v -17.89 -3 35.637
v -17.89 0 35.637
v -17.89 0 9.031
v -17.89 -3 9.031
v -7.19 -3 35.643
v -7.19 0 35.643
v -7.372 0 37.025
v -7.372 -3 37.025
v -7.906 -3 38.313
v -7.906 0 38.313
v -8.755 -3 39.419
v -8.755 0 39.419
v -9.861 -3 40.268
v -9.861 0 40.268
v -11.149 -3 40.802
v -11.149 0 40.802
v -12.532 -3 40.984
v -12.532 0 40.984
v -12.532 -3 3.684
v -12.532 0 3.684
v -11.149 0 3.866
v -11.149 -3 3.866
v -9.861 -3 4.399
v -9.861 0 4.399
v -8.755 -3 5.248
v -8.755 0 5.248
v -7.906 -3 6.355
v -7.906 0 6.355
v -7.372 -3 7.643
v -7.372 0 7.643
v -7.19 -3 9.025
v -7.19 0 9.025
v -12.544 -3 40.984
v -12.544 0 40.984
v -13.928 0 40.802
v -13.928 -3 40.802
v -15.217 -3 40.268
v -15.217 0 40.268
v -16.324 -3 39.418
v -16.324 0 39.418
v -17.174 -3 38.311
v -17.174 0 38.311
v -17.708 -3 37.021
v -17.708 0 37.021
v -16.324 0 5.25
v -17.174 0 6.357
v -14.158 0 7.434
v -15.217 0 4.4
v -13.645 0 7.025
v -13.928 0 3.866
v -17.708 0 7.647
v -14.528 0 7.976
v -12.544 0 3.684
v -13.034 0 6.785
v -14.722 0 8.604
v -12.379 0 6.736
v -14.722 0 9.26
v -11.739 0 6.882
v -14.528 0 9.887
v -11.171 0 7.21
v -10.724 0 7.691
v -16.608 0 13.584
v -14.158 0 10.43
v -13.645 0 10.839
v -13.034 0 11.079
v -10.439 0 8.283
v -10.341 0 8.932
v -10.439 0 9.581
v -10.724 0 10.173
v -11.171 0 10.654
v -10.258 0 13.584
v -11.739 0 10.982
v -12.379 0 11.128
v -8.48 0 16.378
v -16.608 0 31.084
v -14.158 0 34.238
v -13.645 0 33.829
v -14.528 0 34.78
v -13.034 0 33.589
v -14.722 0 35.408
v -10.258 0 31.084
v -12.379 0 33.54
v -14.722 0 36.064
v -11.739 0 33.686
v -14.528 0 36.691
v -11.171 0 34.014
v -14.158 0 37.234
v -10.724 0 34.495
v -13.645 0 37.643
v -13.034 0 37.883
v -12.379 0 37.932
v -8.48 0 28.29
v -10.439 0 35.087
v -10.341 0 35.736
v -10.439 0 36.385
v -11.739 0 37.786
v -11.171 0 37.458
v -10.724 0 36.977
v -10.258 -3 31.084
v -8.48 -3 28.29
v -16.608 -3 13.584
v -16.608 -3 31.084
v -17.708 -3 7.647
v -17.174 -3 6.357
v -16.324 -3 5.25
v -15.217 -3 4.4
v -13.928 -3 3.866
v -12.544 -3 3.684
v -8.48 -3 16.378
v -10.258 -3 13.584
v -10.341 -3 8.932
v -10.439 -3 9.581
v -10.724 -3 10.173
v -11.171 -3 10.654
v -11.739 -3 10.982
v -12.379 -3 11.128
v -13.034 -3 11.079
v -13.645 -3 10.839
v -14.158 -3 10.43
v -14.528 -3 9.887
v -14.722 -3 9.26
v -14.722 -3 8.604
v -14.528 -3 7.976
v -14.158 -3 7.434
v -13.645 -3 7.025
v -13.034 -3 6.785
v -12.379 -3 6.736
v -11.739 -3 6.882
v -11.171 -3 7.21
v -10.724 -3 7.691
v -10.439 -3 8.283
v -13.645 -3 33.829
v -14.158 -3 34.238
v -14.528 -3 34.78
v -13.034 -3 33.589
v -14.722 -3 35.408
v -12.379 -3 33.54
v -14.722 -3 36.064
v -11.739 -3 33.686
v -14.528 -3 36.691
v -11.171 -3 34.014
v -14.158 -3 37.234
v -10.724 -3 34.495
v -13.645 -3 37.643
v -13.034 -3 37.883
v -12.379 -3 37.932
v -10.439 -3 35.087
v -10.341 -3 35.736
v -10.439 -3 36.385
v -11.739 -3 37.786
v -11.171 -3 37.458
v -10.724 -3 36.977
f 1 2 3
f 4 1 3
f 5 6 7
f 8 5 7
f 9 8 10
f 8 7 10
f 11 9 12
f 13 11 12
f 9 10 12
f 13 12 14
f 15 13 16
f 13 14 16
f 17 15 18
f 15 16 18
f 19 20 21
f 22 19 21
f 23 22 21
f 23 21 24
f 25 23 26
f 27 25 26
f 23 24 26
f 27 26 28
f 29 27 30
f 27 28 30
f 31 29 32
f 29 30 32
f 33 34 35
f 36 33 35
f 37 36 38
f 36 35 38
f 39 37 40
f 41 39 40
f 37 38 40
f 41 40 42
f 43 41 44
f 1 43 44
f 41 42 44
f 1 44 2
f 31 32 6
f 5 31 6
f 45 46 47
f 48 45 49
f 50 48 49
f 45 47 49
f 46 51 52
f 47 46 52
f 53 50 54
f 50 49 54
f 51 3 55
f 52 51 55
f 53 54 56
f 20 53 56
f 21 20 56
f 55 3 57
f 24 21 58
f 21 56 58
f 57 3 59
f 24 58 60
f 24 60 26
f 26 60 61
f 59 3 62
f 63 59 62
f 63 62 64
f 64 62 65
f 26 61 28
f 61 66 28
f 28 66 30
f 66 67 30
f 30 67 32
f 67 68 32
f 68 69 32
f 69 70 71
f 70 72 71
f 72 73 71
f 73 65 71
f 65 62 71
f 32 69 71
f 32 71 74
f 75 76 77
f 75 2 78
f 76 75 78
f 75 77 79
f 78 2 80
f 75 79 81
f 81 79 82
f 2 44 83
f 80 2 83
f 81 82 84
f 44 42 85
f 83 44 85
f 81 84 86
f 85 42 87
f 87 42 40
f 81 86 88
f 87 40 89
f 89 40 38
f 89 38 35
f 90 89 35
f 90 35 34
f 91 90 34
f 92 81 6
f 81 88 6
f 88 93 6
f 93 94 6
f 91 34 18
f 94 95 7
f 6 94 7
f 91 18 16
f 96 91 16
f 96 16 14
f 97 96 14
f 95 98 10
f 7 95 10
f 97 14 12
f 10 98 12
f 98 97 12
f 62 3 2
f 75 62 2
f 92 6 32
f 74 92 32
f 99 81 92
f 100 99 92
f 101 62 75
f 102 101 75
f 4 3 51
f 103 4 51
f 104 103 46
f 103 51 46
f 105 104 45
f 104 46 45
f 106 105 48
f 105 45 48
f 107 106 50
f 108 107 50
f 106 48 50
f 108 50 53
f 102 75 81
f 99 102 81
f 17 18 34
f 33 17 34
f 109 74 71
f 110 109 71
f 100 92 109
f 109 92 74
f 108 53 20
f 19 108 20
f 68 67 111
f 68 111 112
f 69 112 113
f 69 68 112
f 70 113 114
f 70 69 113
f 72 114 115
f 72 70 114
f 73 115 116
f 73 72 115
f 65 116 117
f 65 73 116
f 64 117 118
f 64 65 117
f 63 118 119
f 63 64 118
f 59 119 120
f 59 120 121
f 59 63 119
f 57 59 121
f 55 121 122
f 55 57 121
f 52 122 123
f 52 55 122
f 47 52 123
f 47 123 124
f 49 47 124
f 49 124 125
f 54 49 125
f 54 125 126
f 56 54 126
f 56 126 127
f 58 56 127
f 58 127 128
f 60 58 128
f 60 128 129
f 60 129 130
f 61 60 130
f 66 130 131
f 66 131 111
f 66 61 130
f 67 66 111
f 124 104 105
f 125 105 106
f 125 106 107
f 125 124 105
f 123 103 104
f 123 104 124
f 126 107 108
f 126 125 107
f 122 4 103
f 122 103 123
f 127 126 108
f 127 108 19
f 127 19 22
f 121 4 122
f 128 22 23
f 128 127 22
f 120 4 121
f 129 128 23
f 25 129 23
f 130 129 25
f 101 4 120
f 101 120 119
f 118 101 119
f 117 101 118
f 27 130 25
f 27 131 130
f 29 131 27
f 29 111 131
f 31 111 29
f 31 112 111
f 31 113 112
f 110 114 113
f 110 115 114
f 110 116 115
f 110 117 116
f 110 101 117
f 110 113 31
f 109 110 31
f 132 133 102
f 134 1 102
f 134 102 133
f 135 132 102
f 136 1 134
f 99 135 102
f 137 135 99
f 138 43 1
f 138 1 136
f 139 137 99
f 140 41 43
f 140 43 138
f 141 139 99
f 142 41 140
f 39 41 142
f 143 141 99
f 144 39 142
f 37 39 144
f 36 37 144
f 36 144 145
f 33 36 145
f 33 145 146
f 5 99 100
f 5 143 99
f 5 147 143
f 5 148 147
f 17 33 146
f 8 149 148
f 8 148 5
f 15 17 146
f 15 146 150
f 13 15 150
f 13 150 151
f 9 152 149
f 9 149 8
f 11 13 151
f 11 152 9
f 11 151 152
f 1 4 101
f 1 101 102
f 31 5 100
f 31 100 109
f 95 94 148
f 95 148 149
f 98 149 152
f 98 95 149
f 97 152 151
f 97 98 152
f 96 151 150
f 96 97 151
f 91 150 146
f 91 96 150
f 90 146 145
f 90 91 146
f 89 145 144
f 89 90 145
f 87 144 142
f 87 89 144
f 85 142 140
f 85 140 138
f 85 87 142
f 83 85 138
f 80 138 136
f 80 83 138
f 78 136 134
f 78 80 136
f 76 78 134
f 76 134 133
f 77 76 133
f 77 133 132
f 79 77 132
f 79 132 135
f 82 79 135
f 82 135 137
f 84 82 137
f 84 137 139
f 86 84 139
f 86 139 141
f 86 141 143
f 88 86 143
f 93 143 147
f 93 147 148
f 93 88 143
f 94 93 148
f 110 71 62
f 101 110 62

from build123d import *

# Parameters (mm, degrees)
F0_R     = 2.202397
F1_DEPTH = 2.999994


with BuildPart() as f1:
    # F0 (on Front) → F1 (new body)
    with BuildSketch(Plane.XZ):
        with BuildLine():
            ThreePointArc((-7.190473, 35.642618), (-8.754892, 39.419458), (-12.531732, 40.983877))
            Line((-12.531732, 40.983877), (-12.543772, 40.983877))
            ThreePointArc((-12.543772, 40.983877), (-16.32446, 39.417865), (-17.890472, 35.637177))
            Line((-17.890472, 35.637177), (-17.890472, 9.030575))
            ThreePointArc((-17.890472, 9.030575), (-16.32446, 5.249888), (-12.543772, 3.683875))
            Line((-12.543772, 3.683875), (-12.531732, 3.683875))
            ThreePointArc((-12.531732, 3.683875), (-8.754892, 5.248294), (-7.190473, 9.025134))
            Line((-7.190473, 9.025134), (-7.190473, 35.642618))
        make_face()
        with Locations((-12.543772, 8.931871)):
            Circle(F0_R, mode=Mode.SUBTRACT)
        Polygon((-8.479772, 16.377876), (-10.257772, 13.583876), (-16.607772, 13.583876), (-16.607772, 31.083876), (-10.257772, 31.083876), (-8.479772, 28.289876), align=None, mode=Mode.SUBTRACT)
        with Locations((-12.543772, 35.735881)):
            Circle(F0_R, mode=Mode.SUBTRACT)
    extrude(amount=F1_DEPTH)


solid = f1.part
